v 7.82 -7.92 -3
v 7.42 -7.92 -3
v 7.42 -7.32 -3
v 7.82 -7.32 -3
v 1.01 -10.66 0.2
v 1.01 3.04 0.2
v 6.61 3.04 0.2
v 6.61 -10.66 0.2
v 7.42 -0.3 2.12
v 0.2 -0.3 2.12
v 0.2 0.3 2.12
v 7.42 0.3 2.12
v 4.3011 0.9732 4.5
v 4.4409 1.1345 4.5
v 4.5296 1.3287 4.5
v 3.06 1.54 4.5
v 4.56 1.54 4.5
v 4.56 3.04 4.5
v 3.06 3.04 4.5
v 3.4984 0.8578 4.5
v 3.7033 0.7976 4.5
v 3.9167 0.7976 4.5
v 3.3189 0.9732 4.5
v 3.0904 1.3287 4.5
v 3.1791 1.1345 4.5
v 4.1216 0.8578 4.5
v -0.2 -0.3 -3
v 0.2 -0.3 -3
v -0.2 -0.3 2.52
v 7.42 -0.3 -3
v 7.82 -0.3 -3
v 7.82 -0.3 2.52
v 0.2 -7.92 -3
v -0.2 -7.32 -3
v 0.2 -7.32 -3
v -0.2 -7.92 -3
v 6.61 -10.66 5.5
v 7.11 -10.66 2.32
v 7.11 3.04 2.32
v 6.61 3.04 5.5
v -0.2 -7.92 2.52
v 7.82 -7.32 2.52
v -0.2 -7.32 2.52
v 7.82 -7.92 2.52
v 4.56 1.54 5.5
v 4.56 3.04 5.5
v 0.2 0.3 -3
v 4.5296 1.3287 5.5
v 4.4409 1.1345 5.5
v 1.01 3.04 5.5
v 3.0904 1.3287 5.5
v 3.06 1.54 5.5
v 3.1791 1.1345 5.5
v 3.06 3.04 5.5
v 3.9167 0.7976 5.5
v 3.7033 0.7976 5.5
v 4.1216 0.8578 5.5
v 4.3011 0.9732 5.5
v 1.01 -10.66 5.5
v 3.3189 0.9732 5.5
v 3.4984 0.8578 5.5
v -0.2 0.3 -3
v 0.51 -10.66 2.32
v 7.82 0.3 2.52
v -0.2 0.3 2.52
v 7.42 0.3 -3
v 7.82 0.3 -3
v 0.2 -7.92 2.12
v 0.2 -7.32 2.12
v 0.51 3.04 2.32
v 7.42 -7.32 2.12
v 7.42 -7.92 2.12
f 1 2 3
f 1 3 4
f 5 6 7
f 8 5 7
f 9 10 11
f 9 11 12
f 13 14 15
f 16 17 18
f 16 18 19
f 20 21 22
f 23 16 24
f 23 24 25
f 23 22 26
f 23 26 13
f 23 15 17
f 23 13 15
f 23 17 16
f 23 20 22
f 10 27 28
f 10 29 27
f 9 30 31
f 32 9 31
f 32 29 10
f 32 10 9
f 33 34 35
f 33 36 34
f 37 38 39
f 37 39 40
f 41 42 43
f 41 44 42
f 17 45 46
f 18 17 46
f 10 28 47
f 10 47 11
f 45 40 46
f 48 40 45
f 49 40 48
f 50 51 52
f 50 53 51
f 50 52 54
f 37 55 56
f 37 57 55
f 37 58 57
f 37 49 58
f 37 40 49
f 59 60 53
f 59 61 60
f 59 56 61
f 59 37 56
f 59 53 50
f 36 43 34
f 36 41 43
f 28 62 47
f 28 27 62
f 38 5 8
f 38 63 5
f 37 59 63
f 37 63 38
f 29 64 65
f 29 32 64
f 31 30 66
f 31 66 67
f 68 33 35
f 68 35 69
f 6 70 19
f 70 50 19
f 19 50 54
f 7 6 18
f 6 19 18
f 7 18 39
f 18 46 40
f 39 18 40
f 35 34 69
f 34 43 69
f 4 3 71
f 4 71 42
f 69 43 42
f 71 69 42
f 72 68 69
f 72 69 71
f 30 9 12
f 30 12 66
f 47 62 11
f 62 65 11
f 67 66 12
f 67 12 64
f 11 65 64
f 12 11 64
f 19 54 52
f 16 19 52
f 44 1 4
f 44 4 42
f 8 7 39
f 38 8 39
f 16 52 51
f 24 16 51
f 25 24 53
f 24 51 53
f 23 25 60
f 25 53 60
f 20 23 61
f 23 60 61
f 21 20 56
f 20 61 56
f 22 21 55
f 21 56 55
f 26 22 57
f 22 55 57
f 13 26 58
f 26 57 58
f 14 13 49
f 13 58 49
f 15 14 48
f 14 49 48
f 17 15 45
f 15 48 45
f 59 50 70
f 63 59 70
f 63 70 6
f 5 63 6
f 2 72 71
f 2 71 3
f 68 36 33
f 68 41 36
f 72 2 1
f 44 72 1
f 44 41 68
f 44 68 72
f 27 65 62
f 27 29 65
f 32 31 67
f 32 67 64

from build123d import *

# Parameters (mm, degrees)
PAD001_DEPTH = 0.3
PAD002_DEPTH = 0.3
PAD_DEPTH    = 6.85
POCKET_DEPTH = 1


with BuildPart() as pad001:
    # Sketch001 → Pad001 (new body, symmetric)
    with BuildSketch(Plane.XZ):
        Polygon((-0.2, -3), (0.2, -3), (0.2, 2.12), (7.42, 2.12), (7.42, -3), (7.82, -3), (7.82, 2.52), (-0.2, 2.52), align=None)
    extrude(amount=PAD001_DEPTH, both=True)


with BuildPart() as pad002:
    # Sketch002 → Pad002 (new body, symmetric)
    with BuildSketch(Plane.XZ.offset(7.62)):
        Polygon((-0.2, -3), (0.2, -3), (0.2, 2.12), (7.42, 2.12), (7.42, -3), (7.82, -3), (7.82, 2.52), (-0.2, 2.52), align=None)
    extrude(amount=PAD002_DEPTH, both=True)


with BuildPart() as pocket:
    # Sketch → Pad (new body, symmetric)
    with BuildSketch(Plane.XZ.offset(3.81)):
        Polygon((1.01, 0.2), (6.61, 0.2), (7.11, 2.32), (6.61, 5.5), (1.01, 5.5), (0.51, 2.32), align=None)
    extrude(amount=PAD_DEPTH, both=True)

    # Sketch003 → Pocket (cut)
    with BuildSketch(Plane(origin=(0, -3.81, 5.5), x_dir=(-1, 0, 0), z_dir=(0, 0, 1))):
        with BuildLine():
            ThreePointArc((-3.06, -5.35), (-3.81, -4.6), (-4.56, -5.35))
            Line((-4.56, -5.35), (-4.56, -6.85))
            Line((-4.56, -6.85), (-3.06, -6.85))
            Line((-3.06, -6.85), (-3.06, -5.35))
        make_face()
    extrude(amount=-POCKET_DEPTH, mode=Mode.SUBTRACT)


solid = Compound([pad001.part, pad002.part, pocket.part])
